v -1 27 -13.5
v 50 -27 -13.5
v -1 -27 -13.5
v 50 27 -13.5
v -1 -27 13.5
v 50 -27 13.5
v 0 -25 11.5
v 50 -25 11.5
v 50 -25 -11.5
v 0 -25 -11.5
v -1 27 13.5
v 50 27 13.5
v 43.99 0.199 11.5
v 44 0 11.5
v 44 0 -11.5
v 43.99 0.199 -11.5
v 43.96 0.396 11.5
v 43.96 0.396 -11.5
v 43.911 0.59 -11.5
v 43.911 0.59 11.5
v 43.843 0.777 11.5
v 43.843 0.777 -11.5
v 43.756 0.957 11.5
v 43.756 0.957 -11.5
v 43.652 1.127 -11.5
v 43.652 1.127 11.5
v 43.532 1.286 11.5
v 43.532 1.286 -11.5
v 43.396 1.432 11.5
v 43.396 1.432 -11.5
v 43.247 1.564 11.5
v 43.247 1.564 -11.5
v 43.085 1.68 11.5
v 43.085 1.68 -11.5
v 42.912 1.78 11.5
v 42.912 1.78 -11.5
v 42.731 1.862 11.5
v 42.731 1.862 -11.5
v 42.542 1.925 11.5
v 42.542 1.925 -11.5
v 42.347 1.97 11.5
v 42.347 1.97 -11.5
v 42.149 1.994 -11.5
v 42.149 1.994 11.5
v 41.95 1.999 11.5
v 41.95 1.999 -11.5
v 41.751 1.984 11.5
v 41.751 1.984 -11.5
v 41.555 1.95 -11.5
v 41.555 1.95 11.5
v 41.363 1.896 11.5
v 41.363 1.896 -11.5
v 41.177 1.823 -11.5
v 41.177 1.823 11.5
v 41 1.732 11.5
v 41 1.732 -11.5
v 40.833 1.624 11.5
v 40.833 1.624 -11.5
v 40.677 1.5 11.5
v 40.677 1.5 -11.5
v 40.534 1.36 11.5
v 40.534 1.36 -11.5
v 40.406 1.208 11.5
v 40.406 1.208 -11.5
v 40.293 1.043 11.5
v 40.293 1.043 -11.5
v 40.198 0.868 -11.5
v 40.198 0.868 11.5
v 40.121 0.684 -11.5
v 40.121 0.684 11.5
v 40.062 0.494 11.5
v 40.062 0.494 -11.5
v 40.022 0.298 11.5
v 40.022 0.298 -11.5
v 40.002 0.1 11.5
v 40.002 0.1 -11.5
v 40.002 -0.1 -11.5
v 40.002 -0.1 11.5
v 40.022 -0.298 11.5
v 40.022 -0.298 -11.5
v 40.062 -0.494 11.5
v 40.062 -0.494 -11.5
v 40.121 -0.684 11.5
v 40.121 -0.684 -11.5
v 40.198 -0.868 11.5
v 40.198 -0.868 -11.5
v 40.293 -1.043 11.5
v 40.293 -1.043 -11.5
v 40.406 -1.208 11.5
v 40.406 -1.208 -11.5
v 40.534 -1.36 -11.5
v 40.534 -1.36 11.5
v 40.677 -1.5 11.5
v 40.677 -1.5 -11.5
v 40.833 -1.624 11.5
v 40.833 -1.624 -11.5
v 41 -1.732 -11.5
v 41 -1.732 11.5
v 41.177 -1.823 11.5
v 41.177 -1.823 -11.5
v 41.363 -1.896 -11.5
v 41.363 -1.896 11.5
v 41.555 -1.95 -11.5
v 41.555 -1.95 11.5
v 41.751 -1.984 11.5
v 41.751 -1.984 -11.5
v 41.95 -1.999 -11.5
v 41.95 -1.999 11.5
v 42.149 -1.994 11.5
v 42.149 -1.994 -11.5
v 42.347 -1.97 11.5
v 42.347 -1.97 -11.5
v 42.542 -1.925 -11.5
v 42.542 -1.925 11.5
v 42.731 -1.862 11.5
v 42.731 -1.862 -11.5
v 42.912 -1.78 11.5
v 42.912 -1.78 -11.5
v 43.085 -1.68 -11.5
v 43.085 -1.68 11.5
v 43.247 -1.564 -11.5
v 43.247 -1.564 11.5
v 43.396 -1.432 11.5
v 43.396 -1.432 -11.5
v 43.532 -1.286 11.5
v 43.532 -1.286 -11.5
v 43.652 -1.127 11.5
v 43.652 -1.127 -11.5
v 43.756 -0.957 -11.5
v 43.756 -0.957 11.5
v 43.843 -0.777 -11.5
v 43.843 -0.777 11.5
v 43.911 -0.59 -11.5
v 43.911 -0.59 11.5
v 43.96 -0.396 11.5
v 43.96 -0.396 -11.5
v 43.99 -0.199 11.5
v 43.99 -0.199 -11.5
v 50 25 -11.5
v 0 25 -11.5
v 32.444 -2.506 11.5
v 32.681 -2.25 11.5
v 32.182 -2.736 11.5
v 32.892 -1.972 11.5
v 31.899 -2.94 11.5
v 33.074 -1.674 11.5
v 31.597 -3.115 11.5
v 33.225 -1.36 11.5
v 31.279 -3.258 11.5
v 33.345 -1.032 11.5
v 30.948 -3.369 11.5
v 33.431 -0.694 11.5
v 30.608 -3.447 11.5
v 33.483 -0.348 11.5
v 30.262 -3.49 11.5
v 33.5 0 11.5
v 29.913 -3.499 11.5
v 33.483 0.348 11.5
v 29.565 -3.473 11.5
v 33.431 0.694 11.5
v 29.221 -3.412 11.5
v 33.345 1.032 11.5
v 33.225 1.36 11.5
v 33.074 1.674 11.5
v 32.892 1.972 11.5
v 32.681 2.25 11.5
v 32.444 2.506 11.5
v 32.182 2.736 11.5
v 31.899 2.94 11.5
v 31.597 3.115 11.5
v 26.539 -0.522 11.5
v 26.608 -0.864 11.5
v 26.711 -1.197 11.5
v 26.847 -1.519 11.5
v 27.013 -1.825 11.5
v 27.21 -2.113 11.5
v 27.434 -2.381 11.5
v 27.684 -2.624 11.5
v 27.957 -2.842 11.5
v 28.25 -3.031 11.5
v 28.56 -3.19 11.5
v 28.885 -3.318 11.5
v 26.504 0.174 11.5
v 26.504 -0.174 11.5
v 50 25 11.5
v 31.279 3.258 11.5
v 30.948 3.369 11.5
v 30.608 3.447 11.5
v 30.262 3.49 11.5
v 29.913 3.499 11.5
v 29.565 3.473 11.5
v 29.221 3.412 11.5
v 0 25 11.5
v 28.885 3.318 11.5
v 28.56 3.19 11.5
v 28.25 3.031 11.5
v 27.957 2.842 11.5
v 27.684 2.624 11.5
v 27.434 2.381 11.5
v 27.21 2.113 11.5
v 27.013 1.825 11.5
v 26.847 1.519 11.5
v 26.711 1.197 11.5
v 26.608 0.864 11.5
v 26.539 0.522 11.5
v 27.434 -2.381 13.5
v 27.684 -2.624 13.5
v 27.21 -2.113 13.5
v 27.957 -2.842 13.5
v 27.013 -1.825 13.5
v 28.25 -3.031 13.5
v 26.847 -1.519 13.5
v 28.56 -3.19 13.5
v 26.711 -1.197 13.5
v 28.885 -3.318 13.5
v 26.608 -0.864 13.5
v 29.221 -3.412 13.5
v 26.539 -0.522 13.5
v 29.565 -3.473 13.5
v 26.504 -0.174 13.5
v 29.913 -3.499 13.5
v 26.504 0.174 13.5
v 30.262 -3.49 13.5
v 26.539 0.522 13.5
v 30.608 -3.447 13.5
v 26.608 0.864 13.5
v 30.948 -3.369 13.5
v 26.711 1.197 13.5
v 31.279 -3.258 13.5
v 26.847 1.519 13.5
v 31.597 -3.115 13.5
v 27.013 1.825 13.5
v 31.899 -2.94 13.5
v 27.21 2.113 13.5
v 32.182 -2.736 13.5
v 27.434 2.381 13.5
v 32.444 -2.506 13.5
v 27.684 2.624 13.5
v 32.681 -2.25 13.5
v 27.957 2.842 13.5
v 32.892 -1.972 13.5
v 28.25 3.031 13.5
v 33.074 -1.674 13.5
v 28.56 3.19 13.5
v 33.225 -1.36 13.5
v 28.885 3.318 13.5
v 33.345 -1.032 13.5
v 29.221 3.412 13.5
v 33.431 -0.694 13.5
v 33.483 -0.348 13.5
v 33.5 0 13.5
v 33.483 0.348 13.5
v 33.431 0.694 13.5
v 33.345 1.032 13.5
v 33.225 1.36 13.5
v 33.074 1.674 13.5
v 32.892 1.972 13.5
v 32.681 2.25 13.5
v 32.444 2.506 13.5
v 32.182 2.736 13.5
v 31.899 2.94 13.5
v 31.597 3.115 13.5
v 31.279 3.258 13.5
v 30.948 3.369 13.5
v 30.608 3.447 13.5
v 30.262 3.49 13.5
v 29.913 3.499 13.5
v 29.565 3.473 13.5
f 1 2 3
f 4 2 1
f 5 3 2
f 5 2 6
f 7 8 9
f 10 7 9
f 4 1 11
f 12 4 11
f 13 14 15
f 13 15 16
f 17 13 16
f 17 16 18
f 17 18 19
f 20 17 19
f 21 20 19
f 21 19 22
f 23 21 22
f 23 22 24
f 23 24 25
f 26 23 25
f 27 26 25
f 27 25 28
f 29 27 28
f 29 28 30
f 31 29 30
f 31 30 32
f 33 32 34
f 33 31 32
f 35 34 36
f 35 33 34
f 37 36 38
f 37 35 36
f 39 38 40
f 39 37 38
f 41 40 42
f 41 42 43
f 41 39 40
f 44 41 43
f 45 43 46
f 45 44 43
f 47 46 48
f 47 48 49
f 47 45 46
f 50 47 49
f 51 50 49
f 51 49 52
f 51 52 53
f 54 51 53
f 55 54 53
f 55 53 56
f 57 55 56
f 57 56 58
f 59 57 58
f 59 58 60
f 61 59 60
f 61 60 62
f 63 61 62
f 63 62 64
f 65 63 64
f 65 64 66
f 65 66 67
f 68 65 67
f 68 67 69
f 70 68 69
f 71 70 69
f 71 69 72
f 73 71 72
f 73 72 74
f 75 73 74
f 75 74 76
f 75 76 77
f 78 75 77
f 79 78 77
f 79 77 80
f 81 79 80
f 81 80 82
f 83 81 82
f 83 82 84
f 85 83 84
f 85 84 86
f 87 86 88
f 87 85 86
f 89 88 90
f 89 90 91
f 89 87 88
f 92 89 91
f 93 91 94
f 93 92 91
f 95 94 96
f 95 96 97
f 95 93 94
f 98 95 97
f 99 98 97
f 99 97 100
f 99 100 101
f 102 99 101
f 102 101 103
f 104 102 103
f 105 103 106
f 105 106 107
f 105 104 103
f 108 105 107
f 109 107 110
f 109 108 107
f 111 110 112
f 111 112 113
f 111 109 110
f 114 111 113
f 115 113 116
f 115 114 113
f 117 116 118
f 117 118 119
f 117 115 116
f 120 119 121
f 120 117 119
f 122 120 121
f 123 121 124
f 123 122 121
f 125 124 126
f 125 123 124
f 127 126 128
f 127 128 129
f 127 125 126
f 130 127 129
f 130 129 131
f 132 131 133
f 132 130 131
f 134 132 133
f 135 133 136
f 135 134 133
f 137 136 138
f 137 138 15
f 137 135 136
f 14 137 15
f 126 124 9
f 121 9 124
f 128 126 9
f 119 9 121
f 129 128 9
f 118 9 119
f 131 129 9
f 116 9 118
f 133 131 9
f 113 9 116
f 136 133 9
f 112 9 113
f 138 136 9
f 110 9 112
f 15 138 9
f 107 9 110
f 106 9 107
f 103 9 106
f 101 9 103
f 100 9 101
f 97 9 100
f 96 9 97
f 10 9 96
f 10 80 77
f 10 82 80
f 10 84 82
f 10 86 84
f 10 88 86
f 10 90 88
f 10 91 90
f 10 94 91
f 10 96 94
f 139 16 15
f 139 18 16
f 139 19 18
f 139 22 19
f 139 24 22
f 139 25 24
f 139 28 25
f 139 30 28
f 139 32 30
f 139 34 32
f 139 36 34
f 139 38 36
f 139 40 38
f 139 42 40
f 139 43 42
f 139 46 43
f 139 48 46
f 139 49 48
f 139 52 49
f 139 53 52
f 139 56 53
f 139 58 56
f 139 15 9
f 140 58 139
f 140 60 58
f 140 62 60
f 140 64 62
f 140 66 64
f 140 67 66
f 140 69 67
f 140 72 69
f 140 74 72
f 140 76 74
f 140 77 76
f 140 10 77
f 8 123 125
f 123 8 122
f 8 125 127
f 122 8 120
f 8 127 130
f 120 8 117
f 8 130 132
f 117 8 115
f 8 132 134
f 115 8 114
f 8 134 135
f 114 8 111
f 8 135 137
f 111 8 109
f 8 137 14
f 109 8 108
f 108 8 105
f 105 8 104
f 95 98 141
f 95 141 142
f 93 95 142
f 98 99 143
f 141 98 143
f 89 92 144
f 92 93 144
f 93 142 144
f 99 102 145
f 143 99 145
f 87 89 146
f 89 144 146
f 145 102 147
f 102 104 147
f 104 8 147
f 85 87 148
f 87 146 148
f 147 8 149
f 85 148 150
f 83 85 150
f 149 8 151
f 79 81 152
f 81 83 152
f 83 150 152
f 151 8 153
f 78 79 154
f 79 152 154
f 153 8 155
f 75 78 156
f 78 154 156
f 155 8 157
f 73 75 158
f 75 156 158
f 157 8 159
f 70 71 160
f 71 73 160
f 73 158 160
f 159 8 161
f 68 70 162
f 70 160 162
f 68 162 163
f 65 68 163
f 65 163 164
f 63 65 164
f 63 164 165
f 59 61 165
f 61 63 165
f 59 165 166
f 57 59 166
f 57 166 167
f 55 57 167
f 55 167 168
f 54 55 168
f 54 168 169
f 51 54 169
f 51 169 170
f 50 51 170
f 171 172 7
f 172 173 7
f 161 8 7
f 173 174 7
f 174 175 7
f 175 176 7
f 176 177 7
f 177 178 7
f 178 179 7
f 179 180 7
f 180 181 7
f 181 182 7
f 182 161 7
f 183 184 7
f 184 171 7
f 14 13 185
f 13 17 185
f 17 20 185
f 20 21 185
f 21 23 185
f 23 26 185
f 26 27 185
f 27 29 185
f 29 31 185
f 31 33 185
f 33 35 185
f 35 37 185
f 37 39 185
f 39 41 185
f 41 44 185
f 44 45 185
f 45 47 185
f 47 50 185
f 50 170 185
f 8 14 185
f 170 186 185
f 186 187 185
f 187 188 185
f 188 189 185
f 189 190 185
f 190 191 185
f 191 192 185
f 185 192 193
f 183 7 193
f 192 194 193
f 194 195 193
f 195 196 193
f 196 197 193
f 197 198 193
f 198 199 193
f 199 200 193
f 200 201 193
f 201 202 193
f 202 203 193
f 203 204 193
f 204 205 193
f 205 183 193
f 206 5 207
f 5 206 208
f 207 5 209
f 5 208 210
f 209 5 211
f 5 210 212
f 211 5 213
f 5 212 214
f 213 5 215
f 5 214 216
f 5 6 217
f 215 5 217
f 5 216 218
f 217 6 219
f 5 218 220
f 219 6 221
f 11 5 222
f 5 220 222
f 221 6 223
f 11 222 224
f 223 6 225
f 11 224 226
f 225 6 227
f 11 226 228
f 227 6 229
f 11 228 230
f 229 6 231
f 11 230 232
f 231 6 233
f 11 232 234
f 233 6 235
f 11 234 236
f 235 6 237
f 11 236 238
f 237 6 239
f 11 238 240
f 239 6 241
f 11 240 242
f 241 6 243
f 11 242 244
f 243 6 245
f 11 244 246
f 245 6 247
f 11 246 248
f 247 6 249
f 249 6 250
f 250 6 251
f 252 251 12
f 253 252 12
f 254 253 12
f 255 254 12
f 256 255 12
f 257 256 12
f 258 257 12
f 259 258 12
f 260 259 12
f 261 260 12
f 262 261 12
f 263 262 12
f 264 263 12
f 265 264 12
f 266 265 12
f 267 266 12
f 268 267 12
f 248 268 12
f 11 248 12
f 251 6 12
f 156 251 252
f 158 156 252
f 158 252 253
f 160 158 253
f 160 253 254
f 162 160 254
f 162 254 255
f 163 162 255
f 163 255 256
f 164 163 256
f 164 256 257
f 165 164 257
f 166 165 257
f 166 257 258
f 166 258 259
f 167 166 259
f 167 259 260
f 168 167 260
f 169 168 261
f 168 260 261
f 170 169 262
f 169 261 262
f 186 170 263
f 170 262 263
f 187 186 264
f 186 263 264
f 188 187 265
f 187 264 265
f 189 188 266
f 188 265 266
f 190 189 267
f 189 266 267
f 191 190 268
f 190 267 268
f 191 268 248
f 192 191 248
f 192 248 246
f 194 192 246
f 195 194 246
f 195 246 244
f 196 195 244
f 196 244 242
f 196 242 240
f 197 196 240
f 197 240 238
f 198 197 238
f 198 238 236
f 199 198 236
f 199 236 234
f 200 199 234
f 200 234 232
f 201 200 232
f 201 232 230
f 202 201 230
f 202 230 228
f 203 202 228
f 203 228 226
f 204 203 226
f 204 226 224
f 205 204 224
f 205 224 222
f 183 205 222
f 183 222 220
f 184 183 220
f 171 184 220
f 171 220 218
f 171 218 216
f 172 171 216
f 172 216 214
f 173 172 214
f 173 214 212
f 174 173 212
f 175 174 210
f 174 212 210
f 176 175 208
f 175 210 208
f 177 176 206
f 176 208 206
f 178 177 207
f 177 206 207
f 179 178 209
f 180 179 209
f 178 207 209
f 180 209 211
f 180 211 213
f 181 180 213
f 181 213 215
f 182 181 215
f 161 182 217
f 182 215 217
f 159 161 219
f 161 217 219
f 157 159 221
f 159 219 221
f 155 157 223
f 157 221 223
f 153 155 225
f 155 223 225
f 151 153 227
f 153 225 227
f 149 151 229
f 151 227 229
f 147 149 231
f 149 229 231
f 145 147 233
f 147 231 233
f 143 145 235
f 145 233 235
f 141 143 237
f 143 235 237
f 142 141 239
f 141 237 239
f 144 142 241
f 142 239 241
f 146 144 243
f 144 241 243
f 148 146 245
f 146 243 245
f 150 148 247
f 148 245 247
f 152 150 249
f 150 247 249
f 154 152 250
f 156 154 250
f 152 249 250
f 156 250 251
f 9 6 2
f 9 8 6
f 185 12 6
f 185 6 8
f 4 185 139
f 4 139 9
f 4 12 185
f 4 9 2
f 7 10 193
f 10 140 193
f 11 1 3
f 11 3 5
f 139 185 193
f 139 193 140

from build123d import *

# Parameters (mm, degrees)
SKETCH_1_W          = 27
SKETCH_1_H          = 54
SKETCH_1_W_2        = 23
SKETCH_1_H_2        = 50
EXTRUDE_1_DEPTH     = 50
SKETCH_2_R          = 3.5
CUT_EXTRUDE_1_DEPTH = 5
SKETCH_3_R          = 2
EXTRUDE_2_DEPTH     = 25
SKETCH_4_W          = 27
SKETCH_4_H          = 54
EXTRUDE_3_DEPTH     = 1


with BuildPart() as part:
    # 草图1 → 凸台-拉伸1 (new body)
    with BuildSketch(Plane(origin=(0, 0, 0), x_dir=(0, 0, -1), z_dir=(1, 0, 0))):
        Rectangle(SKETCH_1_W, SKETCH_1_H)
        Rectangle(SKETCH_1_W_2, SKETCH_1_H_2, mode=Mode.SUBTRACT)
    extrude(amount=EXTRUDE_1_DEPTH)

    # 草图2 → 切除-拉伸1 (cut)
    with BuildSketch(Plane.XY.offset(13.5)):
        with Locations((30, 0)):
            Circle(SKETCH_2_R)
    extrude(amount=-CUT_EXTRUDE_1_DEPTH, mode=Mode.SUBTRACT)

    # 草图3 → 凸台-拉伸2 (add)
    with BuildSketch(Plane.XY.offset(13.5)):
        with Locations((42, 0)):
            Circle(SKETCH_3_R)
    extrude(amount=-EXTRUDE_2_DEPTH)

    # 草图4 → 凸台-拉伸3 (add)
    with BuildSketch(Plane.ZY):
        Rectangle(SKETCH_4_W, SKETCH_4_H)
    extrude(amount=EXTRUDE_3_DEPTH)


solid = part.part
